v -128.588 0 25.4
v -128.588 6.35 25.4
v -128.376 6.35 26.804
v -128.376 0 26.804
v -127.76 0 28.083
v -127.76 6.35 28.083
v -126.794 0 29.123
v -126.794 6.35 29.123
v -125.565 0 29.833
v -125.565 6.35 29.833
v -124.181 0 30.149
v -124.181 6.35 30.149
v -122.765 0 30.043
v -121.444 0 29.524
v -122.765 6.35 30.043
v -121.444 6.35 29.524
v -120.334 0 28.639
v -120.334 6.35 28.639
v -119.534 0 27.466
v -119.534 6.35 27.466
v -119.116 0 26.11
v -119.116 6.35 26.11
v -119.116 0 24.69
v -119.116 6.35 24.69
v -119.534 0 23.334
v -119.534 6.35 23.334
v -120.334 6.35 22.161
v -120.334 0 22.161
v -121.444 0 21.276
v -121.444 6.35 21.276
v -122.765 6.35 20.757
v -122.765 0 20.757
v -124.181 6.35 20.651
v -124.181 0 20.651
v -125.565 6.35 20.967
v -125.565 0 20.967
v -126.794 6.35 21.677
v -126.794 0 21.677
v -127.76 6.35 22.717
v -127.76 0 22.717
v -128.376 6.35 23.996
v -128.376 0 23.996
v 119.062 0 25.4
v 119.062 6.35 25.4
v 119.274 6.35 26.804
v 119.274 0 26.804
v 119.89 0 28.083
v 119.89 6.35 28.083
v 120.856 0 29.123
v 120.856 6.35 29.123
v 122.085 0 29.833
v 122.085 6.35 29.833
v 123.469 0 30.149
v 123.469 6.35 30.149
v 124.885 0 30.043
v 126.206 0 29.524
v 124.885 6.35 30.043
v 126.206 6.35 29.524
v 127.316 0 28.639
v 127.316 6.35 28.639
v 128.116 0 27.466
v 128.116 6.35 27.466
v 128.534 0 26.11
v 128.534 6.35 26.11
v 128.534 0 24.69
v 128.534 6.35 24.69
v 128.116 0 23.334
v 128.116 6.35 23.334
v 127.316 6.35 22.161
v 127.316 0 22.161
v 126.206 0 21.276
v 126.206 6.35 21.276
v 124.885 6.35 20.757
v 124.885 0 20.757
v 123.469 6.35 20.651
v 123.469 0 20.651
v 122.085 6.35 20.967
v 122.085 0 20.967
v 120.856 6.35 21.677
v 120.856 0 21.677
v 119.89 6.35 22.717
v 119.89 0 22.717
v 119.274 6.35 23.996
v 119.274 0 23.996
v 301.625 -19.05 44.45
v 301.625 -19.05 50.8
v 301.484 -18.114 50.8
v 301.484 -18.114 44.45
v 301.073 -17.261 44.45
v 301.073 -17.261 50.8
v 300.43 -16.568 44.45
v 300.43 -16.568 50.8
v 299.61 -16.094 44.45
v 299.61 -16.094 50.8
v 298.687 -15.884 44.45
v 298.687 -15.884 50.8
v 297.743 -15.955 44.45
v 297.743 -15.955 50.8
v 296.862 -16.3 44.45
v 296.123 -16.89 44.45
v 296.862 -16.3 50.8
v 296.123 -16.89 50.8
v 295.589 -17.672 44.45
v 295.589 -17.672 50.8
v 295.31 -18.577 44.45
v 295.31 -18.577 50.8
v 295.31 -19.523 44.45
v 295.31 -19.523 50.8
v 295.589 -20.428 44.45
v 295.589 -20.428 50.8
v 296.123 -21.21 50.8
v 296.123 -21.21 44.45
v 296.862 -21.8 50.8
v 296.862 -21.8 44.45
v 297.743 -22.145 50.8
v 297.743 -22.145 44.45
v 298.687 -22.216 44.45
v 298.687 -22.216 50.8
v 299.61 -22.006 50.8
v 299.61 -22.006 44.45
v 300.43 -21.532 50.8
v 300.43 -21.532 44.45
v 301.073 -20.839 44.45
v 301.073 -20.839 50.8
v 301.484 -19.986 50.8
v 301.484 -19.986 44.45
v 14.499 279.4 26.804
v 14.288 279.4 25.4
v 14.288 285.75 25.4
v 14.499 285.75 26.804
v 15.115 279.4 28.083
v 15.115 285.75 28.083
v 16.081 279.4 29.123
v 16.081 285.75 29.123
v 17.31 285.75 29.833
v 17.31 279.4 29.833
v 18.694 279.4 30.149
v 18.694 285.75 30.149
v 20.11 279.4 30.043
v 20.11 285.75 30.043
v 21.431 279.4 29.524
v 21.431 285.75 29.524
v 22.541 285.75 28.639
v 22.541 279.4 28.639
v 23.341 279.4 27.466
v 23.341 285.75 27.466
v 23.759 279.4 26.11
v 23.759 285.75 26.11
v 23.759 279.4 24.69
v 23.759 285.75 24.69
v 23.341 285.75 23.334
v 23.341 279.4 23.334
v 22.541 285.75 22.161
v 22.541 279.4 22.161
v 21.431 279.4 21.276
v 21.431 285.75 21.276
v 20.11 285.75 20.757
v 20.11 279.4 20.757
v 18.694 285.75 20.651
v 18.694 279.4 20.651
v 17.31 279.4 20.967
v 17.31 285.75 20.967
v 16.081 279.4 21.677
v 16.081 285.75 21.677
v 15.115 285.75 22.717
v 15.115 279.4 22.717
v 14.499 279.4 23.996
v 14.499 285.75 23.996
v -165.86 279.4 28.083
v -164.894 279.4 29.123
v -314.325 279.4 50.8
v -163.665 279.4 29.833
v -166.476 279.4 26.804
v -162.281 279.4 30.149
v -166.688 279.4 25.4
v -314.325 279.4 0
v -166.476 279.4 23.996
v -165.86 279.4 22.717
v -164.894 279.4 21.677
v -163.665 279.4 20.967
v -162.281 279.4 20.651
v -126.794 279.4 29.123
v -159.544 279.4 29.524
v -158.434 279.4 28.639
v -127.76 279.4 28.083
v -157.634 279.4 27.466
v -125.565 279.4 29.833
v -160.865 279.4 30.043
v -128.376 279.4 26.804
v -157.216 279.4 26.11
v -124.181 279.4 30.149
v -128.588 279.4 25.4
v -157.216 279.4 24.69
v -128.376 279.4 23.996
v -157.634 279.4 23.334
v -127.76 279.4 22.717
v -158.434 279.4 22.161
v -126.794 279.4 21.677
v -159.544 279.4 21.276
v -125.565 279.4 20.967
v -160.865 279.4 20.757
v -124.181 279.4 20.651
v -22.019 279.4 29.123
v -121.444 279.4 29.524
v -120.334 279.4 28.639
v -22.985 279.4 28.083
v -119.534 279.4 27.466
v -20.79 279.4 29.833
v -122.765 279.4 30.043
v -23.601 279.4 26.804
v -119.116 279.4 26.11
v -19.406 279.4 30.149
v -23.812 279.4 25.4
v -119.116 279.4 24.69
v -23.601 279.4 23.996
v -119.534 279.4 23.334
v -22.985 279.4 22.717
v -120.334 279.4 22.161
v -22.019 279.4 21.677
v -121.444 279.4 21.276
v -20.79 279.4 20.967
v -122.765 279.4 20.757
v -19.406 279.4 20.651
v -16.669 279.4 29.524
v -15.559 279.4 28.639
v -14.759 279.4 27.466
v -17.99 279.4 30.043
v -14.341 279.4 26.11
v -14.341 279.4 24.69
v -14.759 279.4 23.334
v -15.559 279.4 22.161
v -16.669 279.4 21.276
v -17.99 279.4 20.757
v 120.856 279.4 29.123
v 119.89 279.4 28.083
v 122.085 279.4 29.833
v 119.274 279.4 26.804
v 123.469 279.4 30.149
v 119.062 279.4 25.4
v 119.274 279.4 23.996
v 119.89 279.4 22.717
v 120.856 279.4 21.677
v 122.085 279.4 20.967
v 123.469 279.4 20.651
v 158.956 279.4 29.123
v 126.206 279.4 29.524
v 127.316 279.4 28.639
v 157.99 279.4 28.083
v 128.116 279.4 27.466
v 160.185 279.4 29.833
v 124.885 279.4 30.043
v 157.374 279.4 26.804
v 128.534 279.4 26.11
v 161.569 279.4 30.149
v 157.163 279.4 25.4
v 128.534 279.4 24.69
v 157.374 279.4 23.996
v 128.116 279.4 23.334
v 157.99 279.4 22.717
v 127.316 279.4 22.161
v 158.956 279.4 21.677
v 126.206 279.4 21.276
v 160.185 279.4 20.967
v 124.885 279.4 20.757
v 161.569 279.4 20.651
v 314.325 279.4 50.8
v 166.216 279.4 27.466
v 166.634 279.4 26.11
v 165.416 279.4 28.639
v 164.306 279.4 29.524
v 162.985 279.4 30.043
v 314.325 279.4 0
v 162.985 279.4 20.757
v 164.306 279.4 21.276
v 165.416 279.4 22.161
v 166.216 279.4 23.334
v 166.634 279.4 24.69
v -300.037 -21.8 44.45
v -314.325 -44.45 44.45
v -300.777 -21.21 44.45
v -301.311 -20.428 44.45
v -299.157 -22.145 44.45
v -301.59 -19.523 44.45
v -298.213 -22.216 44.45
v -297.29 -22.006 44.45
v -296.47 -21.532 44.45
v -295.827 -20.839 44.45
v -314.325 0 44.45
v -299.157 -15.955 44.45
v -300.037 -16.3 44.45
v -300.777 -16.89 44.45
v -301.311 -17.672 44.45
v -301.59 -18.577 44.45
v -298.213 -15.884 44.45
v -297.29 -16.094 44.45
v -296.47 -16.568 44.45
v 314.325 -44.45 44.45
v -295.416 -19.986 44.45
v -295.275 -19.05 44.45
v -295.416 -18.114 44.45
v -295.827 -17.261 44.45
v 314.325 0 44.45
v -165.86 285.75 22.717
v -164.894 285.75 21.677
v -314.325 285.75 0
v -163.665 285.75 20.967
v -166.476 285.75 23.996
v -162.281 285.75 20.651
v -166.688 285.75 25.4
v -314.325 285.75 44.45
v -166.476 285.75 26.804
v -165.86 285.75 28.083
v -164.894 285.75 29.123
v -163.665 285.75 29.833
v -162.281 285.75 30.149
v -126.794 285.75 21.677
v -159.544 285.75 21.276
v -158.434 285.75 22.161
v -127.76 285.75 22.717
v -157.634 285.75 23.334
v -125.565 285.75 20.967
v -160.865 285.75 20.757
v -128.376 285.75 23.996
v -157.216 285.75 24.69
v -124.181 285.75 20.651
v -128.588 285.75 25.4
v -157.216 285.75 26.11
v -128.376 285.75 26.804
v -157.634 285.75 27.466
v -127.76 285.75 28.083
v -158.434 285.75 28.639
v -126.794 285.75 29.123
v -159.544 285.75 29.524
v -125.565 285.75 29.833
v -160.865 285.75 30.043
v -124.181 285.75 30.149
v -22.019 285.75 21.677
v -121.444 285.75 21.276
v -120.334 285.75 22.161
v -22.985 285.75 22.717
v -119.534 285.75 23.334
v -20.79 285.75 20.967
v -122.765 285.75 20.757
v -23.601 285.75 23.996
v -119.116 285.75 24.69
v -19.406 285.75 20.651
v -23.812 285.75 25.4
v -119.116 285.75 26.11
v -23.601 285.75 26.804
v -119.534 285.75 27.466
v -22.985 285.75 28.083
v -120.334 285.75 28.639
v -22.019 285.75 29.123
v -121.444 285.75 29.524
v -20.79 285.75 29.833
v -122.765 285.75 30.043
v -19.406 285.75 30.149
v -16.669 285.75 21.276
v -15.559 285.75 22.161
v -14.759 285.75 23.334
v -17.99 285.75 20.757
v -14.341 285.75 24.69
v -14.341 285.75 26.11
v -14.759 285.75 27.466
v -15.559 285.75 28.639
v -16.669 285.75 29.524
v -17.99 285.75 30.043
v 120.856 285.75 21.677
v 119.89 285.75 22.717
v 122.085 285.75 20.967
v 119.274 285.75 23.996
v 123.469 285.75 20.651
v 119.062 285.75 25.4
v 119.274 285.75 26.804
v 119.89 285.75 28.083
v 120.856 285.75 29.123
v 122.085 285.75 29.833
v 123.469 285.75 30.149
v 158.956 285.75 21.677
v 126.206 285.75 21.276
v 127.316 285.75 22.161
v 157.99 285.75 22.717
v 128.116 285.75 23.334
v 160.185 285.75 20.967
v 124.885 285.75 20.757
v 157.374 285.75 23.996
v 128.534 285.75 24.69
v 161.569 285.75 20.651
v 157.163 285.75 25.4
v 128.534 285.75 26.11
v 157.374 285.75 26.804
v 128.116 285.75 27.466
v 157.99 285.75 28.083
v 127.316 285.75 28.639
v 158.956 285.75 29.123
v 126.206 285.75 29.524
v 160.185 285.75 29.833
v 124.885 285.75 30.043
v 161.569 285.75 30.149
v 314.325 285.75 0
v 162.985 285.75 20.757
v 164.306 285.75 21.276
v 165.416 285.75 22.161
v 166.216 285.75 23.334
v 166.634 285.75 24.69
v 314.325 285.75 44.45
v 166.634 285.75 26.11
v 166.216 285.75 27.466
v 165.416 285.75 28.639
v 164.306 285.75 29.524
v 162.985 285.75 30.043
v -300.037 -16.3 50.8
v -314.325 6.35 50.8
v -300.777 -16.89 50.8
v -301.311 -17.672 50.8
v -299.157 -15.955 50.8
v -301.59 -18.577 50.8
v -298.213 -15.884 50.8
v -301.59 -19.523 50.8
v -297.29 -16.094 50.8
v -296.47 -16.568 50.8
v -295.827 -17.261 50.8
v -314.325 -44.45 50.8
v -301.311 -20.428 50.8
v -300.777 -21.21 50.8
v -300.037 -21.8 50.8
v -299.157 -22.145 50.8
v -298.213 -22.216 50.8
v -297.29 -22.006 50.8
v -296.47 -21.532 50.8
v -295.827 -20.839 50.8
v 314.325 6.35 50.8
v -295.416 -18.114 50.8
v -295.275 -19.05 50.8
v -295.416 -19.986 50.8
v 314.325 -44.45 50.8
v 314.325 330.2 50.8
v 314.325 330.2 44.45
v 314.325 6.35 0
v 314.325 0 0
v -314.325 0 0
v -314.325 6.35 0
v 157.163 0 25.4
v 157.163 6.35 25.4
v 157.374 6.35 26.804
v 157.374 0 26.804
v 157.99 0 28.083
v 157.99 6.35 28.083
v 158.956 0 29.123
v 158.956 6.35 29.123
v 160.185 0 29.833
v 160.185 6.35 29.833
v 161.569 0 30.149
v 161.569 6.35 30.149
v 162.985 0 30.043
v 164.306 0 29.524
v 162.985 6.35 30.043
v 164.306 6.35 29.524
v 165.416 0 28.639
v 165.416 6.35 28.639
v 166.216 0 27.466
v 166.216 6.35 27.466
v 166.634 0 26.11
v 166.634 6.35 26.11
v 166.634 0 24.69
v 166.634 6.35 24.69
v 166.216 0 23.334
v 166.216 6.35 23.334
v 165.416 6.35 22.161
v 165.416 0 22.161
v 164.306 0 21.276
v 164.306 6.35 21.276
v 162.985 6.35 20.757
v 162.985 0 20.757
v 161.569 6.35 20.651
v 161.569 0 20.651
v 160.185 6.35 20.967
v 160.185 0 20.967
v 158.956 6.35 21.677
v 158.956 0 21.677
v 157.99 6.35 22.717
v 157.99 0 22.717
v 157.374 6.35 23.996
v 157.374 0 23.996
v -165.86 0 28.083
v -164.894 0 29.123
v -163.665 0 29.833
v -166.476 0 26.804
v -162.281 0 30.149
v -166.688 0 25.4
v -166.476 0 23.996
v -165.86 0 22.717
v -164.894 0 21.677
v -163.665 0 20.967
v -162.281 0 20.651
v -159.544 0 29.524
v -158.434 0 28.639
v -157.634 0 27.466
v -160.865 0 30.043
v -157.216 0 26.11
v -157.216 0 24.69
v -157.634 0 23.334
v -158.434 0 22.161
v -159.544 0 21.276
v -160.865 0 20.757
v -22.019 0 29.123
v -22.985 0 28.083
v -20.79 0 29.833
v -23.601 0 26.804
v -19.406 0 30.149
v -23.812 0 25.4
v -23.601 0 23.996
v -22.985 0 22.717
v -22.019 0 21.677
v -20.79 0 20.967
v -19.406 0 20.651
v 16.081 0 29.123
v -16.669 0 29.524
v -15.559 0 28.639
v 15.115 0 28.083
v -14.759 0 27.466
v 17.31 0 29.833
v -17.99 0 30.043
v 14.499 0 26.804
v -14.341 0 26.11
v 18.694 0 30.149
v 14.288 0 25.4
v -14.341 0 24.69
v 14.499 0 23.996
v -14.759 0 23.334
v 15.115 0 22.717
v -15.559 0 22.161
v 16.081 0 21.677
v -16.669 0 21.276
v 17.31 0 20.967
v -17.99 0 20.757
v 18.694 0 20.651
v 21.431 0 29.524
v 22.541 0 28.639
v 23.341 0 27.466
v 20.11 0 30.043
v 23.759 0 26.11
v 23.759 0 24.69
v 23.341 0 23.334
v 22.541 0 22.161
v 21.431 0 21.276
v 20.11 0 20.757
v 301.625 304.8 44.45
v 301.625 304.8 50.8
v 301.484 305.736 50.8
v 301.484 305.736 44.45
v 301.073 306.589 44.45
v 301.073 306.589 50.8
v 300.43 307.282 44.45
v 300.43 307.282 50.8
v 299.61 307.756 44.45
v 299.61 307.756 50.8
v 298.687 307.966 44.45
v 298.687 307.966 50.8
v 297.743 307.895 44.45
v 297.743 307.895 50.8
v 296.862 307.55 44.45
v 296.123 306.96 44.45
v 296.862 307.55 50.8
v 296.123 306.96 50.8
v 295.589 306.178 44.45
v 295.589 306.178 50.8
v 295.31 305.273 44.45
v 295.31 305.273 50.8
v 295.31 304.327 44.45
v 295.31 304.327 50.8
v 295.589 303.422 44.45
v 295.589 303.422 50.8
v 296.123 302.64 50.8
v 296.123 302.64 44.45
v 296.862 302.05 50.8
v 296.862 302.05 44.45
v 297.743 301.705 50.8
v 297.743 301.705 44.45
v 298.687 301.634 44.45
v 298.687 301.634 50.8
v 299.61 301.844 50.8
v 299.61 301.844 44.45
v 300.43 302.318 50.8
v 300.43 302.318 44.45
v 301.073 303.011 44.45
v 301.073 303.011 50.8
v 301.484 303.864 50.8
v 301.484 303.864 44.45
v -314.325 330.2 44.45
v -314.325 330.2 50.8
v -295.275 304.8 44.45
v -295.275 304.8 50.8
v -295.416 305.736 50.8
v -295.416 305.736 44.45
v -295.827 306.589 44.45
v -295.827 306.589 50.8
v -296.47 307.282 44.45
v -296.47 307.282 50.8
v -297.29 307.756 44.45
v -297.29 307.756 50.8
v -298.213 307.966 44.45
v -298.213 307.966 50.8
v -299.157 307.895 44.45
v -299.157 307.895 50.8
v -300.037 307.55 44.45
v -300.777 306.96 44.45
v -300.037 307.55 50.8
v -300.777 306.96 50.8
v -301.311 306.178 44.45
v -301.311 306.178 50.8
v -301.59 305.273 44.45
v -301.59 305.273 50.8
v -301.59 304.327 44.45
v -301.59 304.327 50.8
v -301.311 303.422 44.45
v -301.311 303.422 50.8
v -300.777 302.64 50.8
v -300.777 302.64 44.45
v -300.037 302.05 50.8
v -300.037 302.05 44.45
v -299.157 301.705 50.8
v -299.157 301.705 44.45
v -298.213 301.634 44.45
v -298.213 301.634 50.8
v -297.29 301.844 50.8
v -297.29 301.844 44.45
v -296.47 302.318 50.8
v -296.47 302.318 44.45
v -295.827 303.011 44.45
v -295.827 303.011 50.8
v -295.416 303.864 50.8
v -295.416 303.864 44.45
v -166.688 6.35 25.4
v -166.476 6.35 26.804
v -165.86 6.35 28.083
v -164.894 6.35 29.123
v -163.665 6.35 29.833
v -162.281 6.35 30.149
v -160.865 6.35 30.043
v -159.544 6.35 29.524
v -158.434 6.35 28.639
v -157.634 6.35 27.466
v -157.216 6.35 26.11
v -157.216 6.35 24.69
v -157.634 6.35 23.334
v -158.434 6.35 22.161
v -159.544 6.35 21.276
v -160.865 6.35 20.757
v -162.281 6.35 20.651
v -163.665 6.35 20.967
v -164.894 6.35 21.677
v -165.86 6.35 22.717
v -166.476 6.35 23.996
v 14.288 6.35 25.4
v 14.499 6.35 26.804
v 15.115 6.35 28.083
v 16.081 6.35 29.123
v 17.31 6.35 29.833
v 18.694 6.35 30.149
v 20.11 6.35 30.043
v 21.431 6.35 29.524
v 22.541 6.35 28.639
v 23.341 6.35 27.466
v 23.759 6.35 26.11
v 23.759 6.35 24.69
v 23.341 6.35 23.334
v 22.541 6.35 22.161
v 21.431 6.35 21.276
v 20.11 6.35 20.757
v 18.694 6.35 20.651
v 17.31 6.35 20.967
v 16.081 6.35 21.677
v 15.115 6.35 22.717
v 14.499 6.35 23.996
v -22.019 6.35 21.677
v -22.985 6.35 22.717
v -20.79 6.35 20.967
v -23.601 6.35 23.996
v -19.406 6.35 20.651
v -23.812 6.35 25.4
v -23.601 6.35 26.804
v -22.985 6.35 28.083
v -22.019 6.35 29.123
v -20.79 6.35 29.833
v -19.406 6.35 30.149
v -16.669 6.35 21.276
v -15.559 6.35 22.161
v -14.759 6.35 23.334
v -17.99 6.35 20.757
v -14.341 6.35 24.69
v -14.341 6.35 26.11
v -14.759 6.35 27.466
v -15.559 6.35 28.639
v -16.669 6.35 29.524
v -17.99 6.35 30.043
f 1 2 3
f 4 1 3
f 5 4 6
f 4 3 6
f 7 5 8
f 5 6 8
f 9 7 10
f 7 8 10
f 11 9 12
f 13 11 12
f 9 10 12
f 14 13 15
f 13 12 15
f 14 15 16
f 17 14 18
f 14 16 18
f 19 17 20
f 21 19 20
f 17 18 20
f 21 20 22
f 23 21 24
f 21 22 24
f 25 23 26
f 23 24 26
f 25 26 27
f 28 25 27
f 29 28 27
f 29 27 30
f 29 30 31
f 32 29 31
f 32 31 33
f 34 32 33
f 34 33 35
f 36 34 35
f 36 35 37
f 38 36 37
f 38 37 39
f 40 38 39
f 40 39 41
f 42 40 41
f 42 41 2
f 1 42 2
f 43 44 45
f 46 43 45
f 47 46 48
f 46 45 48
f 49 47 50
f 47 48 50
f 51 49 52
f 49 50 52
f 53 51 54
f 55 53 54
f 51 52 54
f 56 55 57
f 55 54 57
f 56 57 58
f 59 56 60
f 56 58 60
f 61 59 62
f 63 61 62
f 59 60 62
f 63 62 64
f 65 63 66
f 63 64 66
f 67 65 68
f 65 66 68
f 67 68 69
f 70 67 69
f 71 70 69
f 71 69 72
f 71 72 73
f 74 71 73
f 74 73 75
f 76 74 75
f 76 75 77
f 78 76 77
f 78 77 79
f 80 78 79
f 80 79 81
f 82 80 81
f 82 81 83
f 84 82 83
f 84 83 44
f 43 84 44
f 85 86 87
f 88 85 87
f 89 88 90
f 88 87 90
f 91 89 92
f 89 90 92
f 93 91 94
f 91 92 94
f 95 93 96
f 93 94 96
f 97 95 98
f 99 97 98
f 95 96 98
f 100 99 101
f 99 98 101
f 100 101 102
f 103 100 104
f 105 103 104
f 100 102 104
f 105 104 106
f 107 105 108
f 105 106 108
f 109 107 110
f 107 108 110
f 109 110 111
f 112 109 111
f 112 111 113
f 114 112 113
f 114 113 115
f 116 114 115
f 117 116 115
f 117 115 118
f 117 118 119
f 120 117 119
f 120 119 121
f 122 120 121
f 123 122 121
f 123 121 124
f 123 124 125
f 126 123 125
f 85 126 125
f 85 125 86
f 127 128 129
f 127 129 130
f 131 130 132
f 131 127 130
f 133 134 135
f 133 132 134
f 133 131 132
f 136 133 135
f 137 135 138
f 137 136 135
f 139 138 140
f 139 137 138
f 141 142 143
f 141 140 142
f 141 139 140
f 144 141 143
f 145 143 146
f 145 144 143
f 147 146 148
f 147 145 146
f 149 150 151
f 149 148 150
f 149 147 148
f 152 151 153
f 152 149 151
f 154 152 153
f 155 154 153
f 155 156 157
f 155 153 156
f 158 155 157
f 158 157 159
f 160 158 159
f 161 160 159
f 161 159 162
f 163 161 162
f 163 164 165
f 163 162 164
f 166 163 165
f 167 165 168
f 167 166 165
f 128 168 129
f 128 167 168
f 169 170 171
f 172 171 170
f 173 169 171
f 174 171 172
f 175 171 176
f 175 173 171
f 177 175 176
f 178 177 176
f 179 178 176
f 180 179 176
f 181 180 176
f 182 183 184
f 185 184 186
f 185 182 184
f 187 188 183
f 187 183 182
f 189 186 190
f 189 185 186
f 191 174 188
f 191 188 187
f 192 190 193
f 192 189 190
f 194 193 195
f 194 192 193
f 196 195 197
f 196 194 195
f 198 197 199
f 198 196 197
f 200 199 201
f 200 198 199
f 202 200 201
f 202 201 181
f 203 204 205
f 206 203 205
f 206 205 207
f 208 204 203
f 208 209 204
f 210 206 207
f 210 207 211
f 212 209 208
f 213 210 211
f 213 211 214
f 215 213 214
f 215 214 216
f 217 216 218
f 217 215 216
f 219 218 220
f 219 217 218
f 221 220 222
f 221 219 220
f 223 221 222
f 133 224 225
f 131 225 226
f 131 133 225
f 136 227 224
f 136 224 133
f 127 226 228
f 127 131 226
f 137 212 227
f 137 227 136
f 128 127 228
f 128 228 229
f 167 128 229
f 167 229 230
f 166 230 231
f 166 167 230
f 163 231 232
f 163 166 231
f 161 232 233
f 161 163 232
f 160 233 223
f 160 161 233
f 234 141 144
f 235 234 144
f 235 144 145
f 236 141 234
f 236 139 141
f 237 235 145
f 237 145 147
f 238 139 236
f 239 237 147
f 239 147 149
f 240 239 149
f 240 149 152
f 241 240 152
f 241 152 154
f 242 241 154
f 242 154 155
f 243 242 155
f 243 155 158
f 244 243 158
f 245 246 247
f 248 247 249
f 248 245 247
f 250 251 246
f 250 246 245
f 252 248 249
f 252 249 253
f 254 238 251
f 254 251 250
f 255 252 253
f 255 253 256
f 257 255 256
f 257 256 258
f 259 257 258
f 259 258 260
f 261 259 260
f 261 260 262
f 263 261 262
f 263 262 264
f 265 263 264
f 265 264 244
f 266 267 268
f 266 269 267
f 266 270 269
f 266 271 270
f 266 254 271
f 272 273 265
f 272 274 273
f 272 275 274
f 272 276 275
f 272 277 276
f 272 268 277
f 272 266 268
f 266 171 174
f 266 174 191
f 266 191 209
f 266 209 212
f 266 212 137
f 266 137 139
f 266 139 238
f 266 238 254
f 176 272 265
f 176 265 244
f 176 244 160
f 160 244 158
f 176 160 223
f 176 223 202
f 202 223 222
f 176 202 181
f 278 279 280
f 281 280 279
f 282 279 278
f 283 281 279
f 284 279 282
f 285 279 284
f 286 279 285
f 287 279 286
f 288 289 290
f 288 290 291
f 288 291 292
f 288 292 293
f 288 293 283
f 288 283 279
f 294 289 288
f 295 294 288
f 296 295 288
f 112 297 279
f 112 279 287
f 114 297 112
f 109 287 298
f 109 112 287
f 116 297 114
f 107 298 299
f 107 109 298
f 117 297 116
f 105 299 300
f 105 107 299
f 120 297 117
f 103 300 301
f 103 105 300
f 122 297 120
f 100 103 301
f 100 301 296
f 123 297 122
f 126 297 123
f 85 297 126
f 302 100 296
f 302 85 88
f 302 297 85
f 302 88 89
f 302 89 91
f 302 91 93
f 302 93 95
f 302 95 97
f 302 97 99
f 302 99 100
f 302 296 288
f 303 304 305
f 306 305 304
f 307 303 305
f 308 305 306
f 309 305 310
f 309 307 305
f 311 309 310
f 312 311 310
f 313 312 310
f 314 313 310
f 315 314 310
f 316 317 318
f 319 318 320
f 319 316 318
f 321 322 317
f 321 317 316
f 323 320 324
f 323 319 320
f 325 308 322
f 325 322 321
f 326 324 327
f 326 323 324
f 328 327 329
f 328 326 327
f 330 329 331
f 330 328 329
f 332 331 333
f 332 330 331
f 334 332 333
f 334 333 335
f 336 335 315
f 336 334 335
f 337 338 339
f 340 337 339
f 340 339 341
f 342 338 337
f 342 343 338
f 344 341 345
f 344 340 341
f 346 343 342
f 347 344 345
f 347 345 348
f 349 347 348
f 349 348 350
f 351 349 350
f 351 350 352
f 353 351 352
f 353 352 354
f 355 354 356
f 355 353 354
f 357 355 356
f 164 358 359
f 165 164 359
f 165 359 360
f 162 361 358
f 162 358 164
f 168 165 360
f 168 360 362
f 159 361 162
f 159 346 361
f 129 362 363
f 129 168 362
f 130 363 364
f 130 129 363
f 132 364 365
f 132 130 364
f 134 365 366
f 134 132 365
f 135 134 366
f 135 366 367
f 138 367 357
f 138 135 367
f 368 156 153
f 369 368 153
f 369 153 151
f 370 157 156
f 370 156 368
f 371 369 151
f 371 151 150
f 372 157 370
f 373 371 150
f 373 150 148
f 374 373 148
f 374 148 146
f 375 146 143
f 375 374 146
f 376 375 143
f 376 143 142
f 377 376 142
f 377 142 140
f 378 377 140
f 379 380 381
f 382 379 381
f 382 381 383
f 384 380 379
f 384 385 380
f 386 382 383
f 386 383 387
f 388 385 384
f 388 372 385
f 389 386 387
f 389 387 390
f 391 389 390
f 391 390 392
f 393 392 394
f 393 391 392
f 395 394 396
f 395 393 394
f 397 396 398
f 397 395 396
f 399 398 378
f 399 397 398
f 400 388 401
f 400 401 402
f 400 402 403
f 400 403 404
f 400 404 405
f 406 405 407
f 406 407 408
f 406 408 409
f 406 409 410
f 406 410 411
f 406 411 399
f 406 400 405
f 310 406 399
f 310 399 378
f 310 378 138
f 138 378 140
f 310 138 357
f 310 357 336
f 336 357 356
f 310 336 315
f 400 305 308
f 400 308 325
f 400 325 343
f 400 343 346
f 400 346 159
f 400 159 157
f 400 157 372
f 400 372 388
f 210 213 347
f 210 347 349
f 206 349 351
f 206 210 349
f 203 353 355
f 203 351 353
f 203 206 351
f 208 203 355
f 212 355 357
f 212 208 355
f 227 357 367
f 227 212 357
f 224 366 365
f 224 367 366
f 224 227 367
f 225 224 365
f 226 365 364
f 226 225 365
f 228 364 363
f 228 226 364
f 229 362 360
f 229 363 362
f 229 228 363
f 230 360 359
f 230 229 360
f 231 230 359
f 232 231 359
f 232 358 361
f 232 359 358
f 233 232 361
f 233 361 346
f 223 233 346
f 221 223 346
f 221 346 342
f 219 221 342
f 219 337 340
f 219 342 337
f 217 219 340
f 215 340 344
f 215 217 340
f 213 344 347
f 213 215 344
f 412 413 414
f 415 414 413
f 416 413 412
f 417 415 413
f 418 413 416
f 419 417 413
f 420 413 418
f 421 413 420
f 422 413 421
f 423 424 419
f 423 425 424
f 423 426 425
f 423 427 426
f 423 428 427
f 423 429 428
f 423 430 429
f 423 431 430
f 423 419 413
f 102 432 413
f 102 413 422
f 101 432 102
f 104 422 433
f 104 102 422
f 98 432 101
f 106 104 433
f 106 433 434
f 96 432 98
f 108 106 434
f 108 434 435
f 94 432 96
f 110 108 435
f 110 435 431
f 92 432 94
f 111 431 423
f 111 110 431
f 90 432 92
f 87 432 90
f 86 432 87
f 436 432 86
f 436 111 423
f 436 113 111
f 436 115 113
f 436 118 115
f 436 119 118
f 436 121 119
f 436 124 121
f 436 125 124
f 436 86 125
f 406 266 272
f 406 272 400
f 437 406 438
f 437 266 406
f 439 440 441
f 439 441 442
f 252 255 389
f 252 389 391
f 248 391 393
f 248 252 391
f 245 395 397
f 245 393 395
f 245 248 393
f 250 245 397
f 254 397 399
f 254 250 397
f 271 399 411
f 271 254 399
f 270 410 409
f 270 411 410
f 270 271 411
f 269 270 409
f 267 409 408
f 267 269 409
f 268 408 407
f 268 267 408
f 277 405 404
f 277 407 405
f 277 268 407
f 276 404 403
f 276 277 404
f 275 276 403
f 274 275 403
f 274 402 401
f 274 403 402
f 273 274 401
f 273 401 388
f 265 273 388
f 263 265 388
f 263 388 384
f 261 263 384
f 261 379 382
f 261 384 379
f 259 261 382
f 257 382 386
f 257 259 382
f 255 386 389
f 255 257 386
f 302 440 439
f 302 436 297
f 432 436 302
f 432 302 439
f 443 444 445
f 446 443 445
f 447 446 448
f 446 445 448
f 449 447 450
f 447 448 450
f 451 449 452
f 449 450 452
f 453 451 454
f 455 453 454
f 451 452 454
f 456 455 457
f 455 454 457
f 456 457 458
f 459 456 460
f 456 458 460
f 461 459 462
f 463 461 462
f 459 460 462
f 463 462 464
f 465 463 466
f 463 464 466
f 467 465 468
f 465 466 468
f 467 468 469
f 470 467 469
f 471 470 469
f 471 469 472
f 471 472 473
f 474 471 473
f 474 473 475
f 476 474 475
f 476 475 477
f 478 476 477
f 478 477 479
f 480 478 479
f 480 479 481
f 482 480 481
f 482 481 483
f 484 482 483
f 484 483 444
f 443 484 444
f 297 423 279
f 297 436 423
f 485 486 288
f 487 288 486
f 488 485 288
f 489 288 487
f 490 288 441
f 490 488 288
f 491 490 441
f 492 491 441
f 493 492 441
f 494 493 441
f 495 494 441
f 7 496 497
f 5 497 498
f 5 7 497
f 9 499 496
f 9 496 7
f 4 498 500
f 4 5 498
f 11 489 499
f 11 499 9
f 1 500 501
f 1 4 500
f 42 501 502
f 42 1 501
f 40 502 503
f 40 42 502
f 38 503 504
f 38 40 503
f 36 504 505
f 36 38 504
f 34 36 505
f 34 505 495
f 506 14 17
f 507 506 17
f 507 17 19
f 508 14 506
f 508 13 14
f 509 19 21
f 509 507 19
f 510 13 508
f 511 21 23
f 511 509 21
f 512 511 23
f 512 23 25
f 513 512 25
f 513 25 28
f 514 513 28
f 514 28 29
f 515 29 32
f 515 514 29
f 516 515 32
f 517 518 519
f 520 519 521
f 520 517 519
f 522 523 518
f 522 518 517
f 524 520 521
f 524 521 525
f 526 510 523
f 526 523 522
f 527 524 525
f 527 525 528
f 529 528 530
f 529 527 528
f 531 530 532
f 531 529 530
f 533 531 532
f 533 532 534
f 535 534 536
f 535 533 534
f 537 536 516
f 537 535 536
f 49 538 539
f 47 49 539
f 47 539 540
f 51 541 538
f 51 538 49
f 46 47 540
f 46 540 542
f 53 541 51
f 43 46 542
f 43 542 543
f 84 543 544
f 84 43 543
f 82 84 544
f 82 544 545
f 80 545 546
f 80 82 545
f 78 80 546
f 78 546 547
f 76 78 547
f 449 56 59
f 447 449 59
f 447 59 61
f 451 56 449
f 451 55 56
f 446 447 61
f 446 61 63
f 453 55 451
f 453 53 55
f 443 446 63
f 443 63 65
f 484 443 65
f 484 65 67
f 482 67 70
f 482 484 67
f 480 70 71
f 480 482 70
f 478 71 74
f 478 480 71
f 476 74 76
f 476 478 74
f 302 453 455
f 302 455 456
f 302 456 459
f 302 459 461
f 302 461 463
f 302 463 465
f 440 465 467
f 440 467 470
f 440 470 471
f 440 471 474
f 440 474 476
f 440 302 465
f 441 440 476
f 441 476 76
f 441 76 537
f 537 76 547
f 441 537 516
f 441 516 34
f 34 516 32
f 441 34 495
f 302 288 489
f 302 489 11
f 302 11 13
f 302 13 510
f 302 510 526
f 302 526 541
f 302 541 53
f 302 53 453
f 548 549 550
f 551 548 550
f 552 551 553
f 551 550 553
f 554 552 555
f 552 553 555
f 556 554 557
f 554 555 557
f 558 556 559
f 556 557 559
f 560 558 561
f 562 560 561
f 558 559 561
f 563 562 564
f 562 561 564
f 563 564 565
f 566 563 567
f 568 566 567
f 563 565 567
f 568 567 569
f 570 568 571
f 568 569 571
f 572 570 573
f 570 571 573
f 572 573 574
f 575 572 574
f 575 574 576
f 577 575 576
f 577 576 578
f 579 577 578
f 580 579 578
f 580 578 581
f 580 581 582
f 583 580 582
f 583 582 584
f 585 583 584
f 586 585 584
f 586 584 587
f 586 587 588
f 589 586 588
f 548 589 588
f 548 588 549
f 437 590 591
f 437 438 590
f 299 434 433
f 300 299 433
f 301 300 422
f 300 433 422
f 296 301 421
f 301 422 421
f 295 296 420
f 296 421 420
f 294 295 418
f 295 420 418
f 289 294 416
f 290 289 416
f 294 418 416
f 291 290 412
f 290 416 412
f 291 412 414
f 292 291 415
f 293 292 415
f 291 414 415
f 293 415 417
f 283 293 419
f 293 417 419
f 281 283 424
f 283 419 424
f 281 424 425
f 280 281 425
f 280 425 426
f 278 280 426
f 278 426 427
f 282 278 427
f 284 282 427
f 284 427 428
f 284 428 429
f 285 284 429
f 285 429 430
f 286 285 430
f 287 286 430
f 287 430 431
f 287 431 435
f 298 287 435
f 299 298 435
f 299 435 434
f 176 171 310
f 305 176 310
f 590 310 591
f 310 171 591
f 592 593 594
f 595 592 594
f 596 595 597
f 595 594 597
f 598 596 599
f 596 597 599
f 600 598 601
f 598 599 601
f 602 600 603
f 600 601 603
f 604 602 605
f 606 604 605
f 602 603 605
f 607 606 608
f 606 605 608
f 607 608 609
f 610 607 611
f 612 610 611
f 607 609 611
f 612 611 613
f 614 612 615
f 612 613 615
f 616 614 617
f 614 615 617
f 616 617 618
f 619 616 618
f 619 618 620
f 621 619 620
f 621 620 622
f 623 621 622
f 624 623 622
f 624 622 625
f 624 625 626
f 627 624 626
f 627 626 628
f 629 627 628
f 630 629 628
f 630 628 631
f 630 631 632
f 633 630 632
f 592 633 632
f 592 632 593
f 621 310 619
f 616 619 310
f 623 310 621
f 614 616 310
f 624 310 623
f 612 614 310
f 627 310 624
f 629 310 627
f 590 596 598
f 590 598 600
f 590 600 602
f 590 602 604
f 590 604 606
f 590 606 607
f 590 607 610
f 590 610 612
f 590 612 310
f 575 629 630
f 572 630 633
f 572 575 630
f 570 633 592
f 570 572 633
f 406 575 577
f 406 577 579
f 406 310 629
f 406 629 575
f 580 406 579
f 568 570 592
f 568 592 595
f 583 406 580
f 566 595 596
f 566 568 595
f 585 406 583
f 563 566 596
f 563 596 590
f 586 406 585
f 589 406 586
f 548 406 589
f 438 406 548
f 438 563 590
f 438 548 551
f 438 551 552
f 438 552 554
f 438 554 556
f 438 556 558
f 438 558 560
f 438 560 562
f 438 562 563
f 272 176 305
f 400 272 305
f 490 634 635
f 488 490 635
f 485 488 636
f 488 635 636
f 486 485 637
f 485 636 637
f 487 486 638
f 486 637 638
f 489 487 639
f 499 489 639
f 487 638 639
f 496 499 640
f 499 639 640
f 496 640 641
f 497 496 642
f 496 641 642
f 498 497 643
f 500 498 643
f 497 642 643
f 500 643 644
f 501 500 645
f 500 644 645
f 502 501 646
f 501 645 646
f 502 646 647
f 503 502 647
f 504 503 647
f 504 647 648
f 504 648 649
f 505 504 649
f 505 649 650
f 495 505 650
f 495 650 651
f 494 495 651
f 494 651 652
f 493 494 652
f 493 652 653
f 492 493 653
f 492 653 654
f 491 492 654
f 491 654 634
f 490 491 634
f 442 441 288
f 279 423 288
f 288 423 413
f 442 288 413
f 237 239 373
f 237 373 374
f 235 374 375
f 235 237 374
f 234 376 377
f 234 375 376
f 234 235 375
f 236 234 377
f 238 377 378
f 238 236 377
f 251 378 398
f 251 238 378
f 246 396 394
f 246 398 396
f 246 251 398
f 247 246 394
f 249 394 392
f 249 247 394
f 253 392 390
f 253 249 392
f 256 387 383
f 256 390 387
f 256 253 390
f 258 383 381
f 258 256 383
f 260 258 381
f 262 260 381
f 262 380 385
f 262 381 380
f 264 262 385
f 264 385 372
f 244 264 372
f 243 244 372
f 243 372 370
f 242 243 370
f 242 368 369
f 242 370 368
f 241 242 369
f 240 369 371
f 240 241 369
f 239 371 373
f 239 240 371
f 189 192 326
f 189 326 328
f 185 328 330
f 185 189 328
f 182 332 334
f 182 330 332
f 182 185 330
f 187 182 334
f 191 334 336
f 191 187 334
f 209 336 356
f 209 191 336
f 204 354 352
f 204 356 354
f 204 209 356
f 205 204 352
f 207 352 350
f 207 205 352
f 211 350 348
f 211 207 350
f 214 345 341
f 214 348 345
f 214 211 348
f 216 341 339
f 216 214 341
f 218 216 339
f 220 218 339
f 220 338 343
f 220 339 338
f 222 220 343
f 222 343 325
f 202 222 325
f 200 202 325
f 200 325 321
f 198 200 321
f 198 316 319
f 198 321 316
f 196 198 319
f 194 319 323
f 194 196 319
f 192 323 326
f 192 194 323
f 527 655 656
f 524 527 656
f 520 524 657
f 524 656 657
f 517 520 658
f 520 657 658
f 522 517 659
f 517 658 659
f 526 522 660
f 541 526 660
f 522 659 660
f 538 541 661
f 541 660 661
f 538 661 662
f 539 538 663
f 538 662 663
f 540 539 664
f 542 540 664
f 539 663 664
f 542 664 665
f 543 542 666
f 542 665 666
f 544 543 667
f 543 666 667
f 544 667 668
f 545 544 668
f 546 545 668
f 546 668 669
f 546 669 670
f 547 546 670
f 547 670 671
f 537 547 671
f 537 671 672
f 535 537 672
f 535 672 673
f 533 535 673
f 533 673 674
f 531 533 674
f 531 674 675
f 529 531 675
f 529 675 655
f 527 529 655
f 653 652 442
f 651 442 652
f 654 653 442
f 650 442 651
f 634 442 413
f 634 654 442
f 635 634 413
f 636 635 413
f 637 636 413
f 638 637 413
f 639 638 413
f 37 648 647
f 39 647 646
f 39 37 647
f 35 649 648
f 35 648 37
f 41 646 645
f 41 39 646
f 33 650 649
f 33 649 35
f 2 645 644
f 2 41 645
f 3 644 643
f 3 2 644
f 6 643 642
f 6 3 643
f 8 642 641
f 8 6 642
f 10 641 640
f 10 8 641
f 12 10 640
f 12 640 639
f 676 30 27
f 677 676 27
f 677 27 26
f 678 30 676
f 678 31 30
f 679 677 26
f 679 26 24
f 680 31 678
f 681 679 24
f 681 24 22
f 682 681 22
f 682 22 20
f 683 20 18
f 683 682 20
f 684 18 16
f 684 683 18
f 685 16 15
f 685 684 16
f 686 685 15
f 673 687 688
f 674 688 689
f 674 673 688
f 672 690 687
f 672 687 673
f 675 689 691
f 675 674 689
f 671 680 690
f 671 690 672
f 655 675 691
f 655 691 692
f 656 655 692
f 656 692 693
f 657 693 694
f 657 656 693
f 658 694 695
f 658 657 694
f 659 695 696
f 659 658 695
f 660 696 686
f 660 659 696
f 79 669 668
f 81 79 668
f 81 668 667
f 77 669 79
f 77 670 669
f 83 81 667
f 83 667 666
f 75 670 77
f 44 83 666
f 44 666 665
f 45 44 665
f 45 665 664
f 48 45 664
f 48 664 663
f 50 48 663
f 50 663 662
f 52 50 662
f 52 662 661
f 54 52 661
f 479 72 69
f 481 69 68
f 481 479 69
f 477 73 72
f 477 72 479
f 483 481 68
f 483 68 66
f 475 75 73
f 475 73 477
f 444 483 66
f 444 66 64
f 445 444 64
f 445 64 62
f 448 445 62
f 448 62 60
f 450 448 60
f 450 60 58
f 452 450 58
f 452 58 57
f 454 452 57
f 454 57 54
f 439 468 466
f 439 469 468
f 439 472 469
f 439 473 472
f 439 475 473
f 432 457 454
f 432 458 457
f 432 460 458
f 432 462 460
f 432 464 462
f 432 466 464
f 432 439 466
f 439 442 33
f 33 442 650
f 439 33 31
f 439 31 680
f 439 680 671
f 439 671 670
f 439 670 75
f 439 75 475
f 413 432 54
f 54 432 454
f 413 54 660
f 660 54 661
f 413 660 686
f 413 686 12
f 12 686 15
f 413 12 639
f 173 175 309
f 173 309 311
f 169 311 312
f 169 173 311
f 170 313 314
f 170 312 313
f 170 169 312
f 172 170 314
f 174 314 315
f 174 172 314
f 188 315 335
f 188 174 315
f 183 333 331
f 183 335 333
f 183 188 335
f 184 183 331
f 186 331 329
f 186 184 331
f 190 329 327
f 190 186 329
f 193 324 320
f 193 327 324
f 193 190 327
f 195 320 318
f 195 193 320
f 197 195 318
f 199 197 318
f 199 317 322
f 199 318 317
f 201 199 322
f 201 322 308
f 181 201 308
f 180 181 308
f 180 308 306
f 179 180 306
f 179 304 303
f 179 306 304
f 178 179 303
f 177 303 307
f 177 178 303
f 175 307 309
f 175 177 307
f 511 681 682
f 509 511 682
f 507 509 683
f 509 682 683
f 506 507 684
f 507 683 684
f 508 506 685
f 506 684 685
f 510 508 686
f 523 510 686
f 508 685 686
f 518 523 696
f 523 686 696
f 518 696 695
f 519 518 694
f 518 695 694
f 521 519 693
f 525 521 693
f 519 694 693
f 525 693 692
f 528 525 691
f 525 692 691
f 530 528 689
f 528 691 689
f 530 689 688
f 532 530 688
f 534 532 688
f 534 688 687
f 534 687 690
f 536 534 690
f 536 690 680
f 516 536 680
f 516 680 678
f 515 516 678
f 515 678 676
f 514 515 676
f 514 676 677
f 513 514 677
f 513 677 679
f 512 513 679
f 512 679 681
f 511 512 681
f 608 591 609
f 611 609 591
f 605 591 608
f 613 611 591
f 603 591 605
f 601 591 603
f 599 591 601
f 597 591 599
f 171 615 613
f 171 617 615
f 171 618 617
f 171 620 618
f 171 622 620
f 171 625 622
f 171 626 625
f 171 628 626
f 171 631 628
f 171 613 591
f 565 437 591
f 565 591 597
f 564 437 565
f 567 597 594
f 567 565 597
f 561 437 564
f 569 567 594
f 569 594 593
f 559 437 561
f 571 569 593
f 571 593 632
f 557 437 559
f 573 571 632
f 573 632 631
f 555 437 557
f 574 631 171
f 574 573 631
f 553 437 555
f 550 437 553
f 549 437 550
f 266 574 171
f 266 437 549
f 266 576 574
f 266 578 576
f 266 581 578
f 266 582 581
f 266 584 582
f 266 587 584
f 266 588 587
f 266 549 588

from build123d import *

# Parameters (mm, degrees)
F1_DEPTH      = 314.325
F2_R          = 3.175
F3_DEPTH      = 50.801
F4_R          = 4.7625
F5_DEPTH      = 50.801
F5_DEPTH_BACK = 323.851


with BuildPart() as f1:
    # F0 (on Right) → F1 (new body, symmetric)
    with BuildSketch(Plane.YZ):
        Polygon((0, 44.45), (0, 0), (6.35, 0), (6.35, 50.8), (-44.45, 50.8), (-44.45, 44.45), align=None)
    extrude(amount=F1_DEPTH, both=True)


with BuildPart() as f1b:
    # F0 (on Right) → F1, piece 2 (new body, symmetric)
    with BuildSketch(Plane.YZ):
        Polygon((330.2, 44.45), (330.2, 50.8), (279.4, 50.8), (279.4, 0), (285.75, 0), (285.75, 44.45), align=None)
    extrude(amount=F1_DEPTH, both=True)


with BuildPart() as f3_tool:
    # F2 (on face) → F3 (new body, through all)
    with BuildSketch(Plane.XY.offset(50.8)):
        with Locations((-298.45, -19.05)):
            Circle(F2_R)
        with Locations((298.45, -19.05)):
            Circle(F2_R)
        with Locations((-298.45, 304.8)):
            Circle(F2_R)
        with Locations((298.45, 304.8)):
            Circle(F2_R)
    extrude(amount=-F3_DEPTH)


with BuildPart() as f1_1:
    add(f1.part)

    # F3: cut by f3_tool
    add(f3_tool.part, mode=Mode.SUBTRACT)


with BuildPart() as f1b_1:
    add(f1b.part)

    # F3: cut by f3_tool
    add(f3_tool.part, mode=Mode.SUBTRACT)


with BuildPart() as f5_tool:
    # F4 (on face) → F5 (new body, two sides)
    with BuildSketch(Plane(origin=(0, 6.35, 0), x_dir=(-1, 0, 0), z_dir=(0, 1, 0))) as f5_sk:
        with Locations((123.825, 25.4)):
            Circle(F4_R)
        with Locations((161.925, 25.4)):
            Circle(F4_R)
        with Locations((19.05, 25.4)):
            Circle(F4_R)
        with Locations((-19.05, 25.4)):
            Circle(F4_R)
        with Locations((-123.825, 25.4)):
            Circle(F4_R)
        with Locations((-161.925, 25.4)):
            Circle(F4_R)
    extrude(amount=-F5_DEPTH)
    extrude(f5_sk.sketch, amount=F5_DEPTH_BACK)


with BuildPart() as f1_2:
    add(f1_1.part)

    # F5: cut by f5_tool
    add(f5_tool.part, mode=Mode.SUBTRACT)


with BuildPart() as f1b_2:
    add(f1b_1.part)

    # F5: cut by f5_tool
    add(f5_tool.part, mode=Mode.SUBTRACT)


solid = Compound([f1_2.part, f1b_2.part])
